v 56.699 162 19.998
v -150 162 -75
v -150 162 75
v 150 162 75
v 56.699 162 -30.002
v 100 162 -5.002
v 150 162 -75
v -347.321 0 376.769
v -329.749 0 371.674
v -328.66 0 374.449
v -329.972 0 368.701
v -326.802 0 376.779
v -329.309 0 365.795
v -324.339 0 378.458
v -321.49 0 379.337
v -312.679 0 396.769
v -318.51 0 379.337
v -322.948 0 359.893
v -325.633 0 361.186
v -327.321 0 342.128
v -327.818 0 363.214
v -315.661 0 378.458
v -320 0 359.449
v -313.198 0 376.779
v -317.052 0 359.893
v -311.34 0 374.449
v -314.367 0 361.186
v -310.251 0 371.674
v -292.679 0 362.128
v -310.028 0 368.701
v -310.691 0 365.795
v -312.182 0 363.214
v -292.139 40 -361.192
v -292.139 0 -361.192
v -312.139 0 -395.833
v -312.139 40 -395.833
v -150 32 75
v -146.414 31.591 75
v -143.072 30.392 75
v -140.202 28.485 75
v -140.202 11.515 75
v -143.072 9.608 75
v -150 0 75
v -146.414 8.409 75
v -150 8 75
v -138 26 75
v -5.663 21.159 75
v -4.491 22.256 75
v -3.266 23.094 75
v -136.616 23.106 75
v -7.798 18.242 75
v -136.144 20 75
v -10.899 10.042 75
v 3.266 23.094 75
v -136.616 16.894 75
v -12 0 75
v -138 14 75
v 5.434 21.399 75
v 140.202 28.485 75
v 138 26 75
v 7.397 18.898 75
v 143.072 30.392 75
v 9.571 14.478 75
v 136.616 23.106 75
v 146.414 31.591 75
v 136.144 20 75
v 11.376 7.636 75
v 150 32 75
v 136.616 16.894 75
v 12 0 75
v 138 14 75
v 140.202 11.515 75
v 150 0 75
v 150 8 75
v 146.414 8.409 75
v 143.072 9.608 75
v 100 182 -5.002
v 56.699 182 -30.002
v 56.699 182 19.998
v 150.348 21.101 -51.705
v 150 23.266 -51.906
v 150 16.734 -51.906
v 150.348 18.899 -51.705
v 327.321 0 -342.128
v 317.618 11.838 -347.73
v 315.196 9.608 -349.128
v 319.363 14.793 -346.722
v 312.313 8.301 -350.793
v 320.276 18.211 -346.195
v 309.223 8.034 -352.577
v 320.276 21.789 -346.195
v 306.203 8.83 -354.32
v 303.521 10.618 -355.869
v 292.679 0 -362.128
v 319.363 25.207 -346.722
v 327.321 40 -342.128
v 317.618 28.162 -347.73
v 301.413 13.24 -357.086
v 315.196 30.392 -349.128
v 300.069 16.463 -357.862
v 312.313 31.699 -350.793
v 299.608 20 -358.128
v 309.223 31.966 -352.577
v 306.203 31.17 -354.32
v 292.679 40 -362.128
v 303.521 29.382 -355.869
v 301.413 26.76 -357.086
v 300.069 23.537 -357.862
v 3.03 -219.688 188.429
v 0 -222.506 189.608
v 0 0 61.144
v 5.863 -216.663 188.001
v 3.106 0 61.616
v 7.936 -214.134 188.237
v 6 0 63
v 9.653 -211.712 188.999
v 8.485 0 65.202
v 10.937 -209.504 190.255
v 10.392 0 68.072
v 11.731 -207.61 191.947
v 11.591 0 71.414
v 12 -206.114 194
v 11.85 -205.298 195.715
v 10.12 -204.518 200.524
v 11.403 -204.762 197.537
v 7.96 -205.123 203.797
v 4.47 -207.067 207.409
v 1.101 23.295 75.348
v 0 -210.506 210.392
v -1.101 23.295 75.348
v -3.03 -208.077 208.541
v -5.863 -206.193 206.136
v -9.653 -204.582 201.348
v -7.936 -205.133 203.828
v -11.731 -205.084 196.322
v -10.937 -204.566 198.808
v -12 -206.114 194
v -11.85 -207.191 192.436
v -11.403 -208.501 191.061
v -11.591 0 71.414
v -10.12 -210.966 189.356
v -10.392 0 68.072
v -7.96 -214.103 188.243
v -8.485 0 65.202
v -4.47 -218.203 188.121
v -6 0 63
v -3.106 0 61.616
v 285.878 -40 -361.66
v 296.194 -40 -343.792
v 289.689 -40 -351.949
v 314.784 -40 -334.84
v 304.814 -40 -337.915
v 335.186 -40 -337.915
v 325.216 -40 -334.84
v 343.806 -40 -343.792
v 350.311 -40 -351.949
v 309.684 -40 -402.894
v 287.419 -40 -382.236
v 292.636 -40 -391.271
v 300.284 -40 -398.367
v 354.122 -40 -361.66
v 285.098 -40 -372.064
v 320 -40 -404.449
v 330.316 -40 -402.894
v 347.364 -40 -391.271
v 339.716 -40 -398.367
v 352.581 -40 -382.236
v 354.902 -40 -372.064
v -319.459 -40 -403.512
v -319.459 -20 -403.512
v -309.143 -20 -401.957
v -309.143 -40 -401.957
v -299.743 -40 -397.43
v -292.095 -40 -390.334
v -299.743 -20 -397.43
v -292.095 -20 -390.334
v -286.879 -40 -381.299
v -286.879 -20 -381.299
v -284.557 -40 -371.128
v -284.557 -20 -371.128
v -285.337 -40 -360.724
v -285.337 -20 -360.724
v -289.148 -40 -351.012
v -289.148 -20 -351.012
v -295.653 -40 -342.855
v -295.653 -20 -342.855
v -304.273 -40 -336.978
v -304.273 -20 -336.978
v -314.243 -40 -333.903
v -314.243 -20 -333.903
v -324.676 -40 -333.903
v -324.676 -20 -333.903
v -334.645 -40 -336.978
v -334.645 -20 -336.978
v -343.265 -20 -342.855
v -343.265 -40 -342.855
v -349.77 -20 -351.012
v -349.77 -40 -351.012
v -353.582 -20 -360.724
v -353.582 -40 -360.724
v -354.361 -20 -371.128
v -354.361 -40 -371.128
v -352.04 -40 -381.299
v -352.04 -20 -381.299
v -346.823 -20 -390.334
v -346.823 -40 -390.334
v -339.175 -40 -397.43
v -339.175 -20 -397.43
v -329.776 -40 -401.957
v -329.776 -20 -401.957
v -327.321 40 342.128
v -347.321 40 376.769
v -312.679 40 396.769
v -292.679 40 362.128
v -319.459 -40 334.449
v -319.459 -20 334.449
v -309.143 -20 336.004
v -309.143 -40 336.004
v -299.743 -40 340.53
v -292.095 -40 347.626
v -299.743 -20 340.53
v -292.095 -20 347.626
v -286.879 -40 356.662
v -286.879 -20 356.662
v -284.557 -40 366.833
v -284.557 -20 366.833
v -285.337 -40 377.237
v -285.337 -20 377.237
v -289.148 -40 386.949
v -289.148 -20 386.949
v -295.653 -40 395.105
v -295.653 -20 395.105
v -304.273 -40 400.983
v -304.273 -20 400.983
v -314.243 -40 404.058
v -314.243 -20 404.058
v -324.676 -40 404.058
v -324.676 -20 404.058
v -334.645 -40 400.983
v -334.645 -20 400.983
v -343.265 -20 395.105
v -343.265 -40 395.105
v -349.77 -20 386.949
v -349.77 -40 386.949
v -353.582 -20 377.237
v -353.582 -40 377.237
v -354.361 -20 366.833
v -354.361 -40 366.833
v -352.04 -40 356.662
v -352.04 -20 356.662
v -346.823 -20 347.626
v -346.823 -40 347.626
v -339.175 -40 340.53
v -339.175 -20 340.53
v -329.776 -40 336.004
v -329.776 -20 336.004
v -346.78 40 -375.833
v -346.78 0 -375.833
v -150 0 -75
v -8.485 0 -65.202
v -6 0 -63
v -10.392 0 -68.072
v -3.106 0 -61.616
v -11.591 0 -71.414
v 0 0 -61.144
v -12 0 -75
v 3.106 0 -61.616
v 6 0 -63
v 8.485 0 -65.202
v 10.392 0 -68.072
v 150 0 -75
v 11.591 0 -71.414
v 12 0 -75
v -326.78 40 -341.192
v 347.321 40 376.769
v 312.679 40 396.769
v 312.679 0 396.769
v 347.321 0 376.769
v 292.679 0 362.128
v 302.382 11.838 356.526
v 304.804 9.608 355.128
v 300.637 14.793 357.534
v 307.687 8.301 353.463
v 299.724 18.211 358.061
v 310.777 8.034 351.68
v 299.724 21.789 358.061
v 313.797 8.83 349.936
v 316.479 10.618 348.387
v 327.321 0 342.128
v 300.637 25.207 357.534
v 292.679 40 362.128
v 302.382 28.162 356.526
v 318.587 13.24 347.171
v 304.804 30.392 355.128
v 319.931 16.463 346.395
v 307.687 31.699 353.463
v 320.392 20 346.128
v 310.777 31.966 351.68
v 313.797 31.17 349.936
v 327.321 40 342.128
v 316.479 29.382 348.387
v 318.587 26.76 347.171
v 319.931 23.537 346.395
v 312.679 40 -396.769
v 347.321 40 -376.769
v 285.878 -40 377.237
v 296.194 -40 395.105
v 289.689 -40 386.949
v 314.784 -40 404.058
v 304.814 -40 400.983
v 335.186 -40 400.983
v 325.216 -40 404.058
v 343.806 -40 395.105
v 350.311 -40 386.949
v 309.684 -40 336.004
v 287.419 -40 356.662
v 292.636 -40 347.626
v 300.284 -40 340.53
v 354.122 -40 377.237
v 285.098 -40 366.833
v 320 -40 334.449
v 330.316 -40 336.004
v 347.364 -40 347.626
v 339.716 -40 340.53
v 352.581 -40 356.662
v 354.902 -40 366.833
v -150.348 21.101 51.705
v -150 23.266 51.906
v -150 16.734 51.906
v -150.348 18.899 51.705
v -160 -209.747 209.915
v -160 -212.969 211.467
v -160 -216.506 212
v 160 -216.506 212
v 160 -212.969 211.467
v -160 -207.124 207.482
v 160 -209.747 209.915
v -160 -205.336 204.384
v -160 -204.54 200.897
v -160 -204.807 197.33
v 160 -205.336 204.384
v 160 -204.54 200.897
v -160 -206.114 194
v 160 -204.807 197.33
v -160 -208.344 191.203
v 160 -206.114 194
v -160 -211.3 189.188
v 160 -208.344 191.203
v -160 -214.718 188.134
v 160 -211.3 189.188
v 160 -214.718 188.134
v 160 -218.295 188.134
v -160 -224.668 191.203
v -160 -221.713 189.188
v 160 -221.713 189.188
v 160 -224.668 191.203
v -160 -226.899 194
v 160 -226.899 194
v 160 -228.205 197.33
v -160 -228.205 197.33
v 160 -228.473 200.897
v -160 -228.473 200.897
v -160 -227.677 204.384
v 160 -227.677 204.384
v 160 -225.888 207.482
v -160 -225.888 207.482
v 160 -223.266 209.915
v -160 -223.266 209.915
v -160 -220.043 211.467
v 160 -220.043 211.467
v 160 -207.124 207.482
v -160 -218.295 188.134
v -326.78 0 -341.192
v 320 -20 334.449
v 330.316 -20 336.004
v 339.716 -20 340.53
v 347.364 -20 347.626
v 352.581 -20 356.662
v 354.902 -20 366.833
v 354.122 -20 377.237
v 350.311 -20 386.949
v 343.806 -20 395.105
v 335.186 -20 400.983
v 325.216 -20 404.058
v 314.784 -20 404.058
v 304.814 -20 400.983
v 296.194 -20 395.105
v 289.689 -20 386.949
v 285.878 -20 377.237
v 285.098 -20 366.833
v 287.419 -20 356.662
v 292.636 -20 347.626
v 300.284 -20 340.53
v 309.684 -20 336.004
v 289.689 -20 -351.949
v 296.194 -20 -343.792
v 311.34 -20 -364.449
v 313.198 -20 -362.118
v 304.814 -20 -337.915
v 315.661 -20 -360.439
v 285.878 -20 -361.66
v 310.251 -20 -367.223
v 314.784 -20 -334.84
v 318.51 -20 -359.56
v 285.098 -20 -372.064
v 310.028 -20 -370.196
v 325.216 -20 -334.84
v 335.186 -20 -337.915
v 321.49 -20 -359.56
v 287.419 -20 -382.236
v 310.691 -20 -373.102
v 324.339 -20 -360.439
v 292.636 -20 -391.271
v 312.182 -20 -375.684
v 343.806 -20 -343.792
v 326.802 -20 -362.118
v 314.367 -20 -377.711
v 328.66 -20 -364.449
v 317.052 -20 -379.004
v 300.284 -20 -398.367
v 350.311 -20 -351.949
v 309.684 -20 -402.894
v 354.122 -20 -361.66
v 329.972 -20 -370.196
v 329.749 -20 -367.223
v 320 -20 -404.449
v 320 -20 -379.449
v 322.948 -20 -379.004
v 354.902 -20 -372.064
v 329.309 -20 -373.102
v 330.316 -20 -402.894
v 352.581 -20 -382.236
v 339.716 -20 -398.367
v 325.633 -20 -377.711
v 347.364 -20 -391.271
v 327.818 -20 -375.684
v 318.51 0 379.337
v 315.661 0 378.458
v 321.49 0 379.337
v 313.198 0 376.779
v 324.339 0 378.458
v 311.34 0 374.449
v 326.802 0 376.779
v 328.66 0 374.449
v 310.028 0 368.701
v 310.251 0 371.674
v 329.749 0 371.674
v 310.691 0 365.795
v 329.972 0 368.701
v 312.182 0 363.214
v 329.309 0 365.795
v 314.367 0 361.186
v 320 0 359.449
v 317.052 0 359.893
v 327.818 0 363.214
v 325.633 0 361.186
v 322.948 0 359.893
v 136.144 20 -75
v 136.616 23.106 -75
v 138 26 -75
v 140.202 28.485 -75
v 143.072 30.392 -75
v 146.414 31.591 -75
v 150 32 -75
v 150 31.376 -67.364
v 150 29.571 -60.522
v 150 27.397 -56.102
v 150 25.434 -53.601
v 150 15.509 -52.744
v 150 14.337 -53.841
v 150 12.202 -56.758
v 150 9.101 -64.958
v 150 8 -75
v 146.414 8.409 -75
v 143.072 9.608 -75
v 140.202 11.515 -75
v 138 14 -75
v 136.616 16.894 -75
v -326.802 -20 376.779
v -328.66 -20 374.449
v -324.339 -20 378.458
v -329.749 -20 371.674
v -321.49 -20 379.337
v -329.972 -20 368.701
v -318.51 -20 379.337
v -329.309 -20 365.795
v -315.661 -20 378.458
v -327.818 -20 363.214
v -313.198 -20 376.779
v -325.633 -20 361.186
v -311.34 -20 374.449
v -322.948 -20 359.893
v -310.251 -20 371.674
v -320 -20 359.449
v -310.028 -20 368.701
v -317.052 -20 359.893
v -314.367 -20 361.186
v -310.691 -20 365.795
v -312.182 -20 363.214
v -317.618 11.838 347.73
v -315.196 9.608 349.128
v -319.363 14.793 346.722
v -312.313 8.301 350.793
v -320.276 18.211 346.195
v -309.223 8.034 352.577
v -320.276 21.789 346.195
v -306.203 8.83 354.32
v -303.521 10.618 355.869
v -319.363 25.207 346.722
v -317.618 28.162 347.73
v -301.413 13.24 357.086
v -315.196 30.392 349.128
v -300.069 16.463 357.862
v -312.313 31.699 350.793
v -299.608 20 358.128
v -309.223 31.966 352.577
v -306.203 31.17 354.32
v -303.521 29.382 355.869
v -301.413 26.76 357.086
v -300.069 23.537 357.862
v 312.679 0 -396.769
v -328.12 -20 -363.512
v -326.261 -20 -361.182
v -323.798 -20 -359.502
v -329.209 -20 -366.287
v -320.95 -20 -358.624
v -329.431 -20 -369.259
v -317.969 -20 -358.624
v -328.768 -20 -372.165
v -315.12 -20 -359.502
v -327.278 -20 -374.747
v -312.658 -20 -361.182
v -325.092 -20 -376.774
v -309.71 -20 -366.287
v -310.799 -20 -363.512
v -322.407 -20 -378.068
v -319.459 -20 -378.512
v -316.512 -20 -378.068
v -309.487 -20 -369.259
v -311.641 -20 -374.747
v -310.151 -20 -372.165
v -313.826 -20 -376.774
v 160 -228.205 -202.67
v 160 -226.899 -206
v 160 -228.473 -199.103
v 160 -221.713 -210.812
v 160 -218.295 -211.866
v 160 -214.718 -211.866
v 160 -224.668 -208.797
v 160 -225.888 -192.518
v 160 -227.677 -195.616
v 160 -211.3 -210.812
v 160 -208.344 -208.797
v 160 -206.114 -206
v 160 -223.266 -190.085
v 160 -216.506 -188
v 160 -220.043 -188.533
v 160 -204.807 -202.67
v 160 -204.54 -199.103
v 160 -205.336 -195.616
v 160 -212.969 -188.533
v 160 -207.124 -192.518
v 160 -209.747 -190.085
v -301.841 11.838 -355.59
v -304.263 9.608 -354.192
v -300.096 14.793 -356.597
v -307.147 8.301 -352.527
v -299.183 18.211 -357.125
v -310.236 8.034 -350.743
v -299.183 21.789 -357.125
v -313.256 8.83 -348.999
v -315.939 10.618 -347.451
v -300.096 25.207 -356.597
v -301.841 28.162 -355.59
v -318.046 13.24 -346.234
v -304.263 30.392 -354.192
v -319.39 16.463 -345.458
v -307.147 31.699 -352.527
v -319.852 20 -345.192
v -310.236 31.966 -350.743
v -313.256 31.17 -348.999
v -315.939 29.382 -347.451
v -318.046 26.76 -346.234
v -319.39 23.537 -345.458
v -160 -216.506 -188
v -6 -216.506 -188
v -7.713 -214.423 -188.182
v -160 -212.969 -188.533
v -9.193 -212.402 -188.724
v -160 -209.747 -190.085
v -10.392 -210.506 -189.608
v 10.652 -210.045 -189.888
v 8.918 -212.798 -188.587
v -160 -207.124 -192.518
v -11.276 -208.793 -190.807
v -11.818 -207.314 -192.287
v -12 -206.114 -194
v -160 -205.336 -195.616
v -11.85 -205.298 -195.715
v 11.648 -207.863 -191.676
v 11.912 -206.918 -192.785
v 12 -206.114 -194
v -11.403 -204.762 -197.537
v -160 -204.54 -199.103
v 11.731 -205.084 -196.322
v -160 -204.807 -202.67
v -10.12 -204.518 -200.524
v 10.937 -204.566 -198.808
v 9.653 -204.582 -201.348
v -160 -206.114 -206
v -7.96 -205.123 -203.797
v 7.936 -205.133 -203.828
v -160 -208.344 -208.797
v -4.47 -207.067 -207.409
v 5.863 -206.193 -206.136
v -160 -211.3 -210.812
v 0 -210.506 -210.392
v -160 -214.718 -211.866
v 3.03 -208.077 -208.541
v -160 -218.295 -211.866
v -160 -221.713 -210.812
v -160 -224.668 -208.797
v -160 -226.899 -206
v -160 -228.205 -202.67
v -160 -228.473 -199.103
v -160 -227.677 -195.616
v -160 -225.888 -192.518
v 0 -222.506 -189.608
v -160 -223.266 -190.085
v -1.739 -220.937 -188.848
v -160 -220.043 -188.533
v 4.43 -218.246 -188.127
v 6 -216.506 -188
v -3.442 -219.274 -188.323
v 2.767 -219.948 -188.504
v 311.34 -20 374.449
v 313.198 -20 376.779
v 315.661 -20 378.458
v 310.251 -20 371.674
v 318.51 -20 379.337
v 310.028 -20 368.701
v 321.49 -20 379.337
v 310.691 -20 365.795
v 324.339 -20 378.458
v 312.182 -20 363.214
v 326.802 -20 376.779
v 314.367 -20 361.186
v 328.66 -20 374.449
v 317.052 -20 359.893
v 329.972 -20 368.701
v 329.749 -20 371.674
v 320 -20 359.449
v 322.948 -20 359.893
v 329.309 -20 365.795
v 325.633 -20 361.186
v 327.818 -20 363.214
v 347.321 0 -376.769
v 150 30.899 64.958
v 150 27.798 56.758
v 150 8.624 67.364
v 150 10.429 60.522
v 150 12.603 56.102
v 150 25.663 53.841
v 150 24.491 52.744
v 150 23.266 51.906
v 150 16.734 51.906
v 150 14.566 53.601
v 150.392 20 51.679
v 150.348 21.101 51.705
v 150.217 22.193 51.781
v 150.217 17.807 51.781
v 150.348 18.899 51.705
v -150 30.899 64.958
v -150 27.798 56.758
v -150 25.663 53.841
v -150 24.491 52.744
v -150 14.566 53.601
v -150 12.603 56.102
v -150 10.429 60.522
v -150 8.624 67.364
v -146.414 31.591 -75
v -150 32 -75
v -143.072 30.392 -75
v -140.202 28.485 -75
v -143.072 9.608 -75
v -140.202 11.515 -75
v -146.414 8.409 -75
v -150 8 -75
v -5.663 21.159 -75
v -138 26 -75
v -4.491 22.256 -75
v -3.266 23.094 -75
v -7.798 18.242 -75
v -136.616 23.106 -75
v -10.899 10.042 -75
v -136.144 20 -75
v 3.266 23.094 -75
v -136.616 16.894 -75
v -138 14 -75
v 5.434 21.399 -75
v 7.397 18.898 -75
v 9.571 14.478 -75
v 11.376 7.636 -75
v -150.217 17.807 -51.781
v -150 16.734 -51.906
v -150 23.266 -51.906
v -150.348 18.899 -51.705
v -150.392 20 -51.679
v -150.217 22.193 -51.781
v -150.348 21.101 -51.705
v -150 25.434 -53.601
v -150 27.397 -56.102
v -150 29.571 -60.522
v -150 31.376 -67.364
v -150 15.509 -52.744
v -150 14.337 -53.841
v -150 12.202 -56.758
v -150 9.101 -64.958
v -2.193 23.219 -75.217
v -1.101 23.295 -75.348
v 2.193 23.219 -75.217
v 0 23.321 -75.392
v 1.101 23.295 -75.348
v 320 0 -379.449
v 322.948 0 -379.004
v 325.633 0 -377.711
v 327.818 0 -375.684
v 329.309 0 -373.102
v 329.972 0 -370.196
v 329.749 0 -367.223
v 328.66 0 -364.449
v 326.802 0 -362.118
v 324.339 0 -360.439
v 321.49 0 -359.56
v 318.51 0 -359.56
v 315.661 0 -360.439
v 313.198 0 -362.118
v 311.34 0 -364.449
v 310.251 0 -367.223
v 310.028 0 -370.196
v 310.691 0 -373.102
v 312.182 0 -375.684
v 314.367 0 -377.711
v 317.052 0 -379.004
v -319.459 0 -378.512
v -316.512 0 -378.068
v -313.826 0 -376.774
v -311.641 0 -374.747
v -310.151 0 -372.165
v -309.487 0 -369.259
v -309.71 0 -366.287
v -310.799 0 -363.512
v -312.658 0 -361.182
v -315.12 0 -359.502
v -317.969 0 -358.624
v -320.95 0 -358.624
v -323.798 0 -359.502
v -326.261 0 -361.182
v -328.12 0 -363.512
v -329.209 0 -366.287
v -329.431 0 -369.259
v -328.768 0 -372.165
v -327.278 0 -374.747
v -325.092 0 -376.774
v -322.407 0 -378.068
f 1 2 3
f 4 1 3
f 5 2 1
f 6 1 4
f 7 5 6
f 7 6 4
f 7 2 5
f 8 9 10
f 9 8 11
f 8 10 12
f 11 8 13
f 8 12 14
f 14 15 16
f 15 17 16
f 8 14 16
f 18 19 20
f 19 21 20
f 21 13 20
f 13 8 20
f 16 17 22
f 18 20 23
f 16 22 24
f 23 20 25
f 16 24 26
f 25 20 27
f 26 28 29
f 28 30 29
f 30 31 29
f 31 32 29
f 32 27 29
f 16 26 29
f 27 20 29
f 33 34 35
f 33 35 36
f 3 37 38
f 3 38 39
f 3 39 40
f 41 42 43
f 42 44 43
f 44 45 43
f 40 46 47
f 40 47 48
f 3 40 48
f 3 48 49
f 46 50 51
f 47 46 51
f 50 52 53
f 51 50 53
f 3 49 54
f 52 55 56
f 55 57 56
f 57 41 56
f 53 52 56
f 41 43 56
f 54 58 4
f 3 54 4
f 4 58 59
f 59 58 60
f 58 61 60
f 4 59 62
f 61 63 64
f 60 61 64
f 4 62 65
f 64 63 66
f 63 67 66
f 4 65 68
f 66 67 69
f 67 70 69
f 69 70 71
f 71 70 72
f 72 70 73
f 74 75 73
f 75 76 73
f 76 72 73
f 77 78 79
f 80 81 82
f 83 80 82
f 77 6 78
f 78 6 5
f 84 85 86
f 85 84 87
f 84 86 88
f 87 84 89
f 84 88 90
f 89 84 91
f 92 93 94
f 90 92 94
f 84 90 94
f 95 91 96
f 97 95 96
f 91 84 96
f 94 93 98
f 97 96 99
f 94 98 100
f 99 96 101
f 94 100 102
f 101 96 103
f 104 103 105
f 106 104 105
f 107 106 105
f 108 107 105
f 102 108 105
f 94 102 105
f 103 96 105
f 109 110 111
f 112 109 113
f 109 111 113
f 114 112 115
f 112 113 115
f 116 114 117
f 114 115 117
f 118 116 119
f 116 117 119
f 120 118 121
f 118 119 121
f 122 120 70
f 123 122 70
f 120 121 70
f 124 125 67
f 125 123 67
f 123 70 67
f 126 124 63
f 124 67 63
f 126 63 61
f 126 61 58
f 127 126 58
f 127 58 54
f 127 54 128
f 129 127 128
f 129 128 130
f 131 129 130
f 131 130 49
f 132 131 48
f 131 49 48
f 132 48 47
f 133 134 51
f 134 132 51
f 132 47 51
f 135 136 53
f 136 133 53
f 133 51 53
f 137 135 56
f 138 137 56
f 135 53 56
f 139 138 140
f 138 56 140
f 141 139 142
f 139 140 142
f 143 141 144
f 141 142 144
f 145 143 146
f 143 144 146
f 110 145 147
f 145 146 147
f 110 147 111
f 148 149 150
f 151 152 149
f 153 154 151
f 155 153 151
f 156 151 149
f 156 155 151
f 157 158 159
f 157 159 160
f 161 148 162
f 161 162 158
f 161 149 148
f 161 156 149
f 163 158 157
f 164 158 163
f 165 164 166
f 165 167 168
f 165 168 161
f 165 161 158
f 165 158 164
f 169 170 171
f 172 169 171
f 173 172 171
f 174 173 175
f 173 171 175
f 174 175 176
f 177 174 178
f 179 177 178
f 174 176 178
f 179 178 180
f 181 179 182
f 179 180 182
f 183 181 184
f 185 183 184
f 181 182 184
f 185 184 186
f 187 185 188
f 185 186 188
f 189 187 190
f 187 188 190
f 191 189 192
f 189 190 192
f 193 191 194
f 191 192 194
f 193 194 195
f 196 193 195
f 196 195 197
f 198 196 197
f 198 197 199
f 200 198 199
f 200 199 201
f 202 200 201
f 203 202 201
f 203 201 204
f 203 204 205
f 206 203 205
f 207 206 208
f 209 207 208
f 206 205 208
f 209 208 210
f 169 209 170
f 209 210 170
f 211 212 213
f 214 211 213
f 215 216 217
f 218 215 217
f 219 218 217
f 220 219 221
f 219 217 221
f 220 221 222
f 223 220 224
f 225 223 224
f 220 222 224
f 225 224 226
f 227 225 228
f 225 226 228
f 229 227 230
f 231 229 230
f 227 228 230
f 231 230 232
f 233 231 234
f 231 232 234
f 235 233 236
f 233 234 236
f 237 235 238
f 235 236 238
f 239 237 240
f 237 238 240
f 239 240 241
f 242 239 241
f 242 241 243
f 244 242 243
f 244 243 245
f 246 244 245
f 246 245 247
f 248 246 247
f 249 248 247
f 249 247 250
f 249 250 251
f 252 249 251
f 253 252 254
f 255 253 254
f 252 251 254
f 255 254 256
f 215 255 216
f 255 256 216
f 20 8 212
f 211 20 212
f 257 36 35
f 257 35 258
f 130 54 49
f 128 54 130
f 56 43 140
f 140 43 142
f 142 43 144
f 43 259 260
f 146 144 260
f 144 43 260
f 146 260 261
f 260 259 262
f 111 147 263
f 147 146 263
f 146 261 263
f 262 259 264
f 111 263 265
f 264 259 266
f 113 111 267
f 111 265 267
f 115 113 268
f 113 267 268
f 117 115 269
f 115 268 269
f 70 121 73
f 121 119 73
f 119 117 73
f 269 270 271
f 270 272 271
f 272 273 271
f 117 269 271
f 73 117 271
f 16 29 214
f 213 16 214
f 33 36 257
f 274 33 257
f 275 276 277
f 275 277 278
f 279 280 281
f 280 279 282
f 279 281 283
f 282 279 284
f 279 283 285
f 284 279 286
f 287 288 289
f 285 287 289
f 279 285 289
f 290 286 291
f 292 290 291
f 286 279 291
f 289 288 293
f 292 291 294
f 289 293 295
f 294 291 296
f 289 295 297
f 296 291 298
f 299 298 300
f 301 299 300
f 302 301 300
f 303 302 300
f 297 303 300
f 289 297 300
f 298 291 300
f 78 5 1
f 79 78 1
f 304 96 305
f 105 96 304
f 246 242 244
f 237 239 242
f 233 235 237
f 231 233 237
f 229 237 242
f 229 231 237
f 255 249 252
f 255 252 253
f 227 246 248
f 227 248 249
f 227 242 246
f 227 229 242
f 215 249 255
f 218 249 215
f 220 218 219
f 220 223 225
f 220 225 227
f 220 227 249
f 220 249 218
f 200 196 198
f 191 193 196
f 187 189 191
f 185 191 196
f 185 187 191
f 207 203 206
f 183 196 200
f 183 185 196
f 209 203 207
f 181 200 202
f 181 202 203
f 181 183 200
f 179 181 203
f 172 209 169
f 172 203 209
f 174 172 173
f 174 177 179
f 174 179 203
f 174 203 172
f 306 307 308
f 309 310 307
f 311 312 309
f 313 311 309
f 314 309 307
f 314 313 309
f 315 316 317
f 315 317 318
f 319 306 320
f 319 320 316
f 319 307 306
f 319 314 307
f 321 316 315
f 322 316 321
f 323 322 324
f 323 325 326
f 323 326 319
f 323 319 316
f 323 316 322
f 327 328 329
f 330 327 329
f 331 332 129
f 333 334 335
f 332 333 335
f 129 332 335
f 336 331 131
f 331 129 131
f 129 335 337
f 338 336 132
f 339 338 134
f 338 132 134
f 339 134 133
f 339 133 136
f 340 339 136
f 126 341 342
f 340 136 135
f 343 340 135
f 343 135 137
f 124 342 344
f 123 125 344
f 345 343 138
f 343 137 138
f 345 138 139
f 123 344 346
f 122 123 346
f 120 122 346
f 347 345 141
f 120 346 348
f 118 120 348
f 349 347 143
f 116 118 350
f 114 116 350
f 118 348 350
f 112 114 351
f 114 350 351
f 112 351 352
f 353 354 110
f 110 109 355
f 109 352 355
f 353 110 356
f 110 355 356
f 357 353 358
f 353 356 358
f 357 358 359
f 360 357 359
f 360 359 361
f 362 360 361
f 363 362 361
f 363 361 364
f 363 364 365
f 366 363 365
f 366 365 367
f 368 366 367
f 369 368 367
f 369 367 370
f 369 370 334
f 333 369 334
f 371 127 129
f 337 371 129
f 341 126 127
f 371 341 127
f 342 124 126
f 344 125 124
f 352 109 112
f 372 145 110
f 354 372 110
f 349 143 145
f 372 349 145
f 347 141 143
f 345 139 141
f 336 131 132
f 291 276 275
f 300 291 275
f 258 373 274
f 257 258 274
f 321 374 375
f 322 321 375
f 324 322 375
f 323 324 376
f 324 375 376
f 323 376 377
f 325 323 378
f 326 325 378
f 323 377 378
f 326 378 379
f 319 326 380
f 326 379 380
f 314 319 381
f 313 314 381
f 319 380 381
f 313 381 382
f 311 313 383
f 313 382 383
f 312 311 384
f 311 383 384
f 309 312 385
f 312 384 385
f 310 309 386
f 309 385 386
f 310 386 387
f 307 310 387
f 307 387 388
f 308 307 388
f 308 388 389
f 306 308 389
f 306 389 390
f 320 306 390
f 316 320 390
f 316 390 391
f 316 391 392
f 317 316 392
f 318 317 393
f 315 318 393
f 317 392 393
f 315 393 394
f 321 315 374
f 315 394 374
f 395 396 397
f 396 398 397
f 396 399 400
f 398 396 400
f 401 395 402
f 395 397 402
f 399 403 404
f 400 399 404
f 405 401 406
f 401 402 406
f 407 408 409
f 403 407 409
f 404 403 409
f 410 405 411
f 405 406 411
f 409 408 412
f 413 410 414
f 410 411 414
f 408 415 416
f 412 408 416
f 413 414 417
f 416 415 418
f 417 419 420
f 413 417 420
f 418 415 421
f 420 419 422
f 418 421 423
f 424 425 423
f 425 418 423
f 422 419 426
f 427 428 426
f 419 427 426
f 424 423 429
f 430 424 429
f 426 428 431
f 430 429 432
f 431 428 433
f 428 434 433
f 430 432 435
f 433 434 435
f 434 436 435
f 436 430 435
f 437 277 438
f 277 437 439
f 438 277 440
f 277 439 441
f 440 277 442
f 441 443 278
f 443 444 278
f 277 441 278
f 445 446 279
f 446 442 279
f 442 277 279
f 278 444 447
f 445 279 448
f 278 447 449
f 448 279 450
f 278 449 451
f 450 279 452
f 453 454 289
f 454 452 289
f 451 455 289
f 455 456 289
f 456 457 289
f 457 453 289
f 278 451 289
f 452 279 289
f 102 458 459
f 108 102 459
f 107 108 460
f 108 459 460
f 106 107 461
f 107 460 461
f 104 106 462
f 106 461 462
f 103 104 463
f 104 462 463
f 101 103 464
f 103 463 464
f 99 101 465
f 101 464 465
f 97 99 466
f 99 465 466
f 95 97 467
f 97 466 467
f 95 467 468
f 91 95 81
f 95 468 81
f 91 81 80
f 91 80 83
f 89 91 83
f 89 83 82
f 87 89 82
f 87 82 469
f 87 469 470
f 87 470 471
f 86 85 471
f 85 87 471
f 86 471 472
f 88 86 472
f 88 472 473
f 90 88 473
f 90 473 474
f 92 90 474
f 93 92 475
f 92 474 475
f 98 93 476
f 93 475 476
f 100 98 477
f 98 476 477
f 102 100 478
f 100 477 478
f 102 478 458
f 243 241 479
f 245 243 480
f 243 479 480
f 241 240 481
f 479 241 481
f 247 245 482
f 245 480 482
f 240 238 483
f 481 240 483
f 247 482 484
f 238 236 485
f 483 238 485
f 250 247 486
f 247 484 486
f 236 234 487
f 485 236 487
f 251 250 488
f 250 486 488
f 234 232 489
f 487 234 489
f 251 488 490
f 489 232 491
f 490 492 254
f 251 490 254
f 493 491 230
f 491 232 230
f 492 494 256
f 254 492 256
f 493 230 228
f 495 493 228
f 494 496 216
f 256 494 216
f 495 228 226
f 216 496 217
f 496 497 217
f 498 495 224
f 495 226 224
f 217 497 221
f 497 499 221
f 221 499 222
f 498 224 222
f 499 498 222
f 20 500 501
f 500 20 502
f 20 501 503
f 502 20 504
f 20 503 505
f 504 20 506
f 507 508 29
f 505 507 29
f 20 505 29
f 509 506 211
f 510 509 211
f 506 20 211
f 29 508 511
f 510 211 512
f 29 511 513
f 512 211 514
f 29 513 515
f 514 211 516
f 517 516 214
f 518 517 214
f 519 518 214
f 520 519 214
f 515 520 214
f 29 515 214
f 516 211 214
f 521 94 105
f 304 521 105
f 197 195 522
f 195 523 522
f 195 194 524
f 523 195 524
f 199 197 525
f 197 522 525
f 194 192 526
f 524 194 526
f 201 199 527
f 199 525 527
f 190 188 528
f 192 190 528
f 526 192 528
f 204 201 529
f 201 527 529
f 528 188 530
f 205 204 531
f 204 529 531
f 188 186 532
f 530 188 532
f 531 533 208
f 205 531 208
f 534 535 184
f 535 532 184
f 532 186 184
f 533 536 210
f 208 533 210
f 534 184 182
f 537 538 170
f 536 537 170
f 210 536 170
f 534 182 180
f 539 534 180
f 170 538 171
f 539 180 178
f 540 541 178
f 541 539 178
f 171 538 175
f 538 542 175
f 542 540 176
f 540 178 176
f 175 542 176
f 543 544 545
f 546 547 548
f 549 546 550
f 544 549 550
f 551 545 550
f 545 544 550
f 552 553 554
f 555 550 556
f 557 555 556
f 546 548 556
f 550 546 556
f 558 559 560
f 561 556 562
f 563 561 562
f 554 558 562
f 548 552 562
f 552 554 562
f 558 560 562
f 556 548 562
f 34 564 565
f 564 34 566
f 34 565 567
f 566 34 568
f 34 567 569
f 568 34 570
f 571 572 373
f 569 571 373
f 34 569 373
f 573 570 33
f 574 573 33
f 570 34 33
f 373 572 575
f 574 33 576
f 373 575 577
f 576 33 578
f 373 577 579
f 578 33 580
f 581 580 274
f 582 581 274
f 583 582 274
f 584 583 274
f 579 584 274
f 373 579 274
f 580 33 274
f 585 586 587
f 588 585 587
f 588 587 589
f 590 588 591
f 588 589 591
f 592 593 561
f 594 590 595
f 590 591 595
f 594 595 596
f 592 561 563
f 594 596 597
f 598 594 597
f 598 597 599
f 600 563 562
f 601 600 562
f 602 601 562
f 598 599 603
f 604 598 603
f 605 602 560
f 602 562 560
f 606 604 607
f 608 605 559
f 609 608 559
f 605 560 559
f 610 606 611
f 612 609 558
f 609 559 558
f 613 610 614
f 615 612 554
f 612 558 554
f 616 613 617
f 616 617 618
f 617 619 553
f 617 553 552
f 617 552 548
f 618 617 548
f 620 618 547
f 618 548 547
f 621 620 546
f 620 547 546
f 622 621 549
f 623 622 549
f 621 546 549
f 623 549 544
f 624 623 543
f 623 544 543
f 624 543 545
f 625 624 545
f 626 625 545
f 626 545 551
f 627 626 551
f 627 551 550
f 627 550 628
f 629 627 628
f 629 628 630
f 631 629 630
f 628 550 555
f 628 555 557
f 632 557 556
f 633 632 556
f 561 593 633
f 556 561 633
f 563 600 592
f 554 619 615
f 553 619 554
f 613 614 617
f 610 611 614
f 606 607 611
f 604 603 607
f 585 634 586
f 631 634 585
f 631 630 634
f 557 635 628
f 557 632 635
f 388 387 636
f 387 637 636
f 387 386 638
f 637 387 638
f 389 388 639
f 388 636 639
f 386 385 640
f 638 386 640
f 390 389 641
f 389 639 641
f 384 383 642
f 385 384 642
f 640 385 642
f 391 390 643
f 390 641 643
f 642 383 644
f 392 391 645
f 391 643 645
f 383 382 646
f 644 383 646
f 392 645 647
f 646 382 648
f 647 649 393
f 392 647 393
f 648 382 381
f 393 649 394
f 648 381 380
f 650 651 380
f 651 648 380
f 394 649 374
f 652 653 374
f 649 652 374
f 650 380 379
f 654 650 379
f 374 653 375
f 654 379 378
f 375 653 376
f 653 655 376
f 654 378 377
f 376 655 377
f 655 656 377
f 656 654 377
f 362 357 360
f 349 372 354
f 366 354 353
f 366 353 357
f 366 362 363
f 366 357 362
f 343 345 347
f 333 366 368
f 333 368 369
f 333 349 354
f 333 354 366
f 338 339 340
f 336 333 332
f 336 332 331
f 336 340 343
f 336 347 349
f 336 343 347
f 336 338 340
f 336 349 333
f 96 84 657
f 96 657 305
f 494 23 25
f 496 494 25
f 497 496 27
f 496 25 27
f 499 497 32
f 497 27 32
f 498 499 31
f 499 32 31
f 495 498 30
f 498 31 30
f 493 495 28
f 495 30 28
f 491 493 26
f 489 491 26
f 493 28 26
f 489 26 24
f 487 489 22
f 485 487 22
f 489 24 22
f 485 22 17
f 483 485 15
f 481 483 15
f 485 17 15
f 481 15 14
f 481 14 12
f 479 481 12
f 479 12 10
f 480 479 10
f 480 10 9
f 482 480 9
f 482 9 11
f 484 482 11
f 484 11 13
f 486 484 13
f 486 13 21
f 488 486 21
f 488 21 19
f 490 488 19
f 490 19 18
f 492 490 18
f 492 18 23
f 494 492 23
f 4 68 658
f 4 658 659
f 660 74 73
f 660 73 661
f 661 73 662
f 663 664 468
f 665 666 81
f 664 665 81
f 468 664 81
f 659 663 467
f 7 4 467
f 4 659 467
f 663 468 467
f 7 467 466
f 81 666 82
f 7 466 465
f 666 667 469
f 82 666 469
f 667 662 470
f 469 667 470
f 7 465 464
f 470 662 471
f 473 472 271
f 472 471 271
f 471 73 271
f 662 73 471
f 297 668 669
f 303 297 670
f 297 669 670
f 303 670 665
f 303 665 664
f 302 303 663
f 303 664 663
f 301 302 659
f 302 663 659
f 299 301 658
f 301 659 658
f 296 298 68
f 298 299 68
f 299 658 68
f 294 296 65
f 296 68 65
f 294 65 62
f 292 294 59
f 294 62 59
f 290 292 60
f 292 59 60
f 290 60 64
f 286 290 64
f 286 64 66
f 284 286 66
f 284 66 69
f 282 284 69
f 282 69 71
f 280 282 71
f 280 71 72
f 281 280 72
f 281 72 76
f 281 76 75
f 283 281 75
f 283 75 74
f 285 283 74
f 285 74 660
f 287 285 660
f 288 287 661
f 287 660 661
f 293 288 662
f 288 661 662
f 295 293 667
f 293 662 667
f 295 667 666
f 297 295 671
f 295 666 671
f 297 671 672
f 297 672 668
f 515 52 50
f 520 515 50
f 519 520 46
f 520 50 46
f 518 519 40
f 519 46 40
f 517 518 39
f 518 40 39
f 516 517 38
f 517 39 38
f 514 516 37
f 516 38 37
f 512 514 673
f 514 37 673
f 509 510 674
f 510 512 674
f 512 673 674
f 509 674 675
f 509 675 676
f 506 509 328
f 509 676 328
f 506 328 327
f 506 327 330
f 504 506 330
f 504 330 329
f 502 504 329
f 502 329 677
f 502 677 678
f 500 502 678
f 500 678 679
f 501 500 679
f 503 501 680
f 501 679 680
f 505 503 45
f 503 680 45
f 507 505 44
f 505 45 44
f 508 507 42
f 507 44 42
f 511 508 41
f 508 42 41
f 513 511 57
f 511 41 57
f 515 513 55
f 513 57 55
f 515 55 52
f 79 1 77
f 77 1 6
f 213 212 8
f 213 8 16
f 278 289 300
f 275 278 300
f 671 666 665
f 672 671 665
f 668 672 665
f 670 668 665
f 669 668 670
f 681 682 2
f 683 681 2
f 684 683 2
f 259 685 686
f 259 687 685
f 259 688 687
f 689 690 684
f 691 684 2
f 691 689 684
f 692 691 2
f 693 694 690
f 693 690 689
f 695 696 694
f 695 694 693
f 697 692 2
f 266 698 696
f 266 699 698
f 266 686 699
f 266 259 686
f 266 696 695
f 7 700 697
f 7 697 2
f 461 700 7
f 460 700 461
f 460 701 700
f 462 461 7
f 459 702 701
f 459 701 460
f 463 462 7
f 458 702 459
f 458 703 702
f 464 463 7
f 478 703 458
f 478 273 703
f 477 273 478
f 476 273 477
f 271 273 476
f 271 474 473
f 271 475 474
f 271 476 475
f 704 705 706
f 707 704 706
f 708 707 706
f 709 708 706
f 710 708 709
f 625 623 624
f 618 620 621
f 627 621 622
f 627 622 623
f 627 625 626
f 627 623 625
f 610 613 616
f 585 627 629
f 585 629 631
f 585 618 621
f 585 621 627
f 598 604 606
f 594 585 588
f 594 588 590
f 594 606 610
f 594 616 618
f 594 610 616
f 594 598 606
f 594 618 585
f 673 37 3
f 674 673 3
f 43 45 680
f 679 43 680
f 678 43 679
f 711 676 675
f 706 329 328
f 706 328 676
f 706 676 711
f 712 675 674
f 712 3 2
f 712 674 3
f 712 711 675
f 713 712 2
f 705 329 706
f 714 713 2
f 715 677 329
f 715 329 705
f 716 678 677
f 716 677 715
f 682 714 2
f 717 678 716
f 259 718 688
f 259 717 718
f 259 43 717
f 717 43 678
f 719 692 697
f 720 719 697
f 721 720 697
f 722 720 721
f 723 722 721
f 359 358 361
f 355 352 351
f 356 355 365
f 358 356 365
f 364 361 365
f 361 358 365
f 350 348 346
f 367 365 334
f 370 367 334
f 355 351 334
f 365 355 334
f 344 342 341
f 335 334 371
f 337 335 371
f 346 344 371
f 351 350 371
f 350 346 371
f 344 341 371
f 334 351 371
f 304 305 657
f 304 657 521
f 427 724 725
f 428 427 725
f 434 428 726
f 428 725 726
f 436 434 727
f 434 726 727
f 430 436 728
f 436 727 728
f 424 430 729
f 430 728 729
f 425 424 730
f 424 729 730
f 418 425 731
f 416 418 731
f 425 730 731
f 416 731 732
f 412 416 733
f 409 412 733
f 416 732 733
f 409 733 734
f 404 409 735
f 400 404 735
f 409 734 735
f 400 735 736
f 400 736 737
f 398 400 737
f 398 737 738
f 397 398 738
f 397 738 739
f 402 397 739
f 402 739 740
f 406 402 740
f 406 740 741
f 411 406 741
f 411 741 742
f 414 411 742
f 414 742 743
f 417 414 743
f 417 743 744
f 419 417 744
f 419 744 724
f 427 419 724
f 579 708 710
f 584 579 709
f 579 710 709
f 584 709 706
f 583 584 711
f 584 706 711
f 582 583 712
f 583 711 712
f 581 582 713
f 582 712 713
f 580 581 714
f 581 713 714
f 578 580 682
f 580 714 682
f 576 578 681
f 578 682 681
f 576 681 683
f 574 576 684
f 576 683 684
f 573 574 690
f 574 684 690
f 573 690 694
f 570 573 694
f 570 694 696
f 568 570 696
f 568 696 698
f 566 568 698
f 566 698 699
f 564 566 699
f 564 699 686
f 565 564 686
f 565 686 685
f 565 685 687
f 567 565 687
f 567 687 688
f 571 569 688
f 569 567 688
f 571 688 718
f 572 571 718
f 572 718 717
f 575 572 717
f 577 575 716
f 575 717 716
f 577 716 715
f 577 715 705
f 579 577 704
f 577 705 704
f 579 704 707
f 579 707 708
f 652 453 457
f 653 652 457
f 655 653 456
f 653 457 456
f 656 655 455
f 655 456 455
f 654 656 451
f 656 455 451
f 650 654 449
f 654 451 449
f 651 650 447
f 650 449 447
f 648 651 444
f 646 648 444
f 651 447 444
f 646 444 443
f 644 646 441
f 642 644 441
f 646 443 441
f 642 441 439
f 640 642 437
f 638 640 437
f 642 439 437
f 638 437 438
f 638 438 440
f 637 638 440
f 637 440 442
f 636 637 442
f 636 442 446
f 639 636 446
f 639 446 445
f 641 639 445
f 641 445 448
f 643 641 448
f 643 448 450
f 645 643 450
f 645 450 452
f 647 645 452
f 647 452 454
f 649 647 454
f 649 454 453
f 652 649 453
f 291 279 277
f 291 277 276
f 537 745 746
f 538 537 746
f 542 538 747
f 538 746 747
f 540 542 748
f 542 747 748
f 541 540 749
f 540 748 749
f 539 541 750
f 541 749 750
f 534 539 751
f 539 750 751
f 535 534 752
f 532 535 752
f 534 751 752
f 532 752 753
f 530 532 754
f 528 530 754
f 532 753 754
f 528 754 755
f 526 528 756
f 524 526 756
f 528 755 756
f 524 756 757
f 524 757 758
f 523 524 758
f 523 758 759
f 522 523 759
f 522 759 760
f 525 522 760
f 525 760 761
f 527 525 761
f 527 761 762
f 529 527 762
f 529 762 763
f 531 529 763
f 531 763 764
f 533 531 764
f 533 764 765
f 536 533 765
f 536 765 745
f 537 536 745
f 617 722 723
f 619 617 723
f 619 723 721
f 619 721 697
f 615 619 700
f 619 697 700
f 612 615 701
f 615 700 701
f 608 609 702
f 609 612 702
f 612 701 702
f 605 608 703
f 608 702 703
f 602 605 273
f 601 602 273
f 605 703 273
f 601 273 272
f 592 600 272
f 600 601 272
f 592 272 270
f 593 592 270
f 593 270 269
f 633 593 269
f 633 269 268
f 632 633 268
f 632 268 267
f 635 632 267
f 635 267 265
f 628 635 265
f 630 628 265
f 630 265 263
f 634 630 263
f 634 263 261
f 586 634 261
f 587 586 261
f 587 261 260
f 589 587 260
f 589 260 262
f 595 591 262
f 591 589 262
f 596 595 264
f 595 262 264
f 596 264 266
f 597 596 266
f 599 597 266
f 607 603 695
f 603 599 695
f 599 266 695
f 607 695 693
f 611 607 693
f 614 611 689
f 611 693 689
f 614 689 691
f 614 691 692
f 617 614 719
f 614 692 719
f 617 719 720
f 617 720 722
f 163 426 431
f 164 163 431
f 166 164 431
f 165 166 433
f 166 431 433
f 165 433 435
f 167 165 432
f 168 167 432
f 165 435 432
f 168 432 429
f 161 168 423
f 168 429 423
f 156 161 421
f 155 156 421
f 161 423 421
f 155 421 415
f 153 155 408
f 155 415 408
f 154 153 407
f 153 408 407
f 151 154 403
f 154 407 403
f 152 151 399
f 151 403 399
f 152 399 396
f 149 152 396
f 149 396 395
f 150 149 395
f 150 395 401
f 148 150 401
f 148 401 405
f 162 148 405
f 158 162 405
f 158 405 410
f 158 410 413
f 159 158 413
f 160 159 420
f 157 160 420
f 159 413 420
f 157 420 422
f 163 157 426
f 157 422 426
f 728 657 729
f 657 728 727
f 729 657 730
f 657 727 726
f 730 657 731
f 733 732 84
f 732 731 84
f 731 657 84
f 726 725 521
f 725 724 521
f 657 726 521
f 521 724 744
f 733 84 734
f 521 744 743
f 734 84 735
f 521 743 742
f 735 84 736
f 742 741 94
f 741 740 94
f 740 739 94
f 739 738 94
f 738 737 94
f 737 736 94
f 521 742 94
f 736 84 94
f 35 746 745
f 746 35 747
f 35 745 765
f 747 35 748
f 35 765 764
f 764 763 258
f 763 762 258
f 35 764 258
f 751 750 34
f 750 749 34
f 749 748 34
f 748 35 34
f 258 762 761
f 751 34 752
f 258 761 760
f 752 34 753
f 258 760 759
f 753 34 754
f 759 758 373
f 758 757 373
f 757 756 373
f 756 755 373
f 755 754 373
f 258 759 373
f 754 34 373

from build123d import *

# Parameters (mm, degrees)
SKETCH_9_W            = 300
SKETCH_9_H            = 150
EXTRUDE_2_DEPTH       = 162
EXTRUDE_3_DEPTH       = 340
EXTRUDE_3_DEPTH_BACK  = 20
SKETCH_10_R           = 12
EXTRUDE_4_DEPTH       = 338.918510241
EXTRUDE_4_DEPTH_BACK  = 20
SKETCH_11_R           = 12
EXTRUDE_5_DEPTH       = 340
EXTRUDE_5_DEPTH_BACK  = 20
SKETCH_13_R           = 12
EXTRUDE_6_DEPTH       = 340
EXTRUDE_6_DEPTH_BACK  = 20
SKETCH_12_R           = 12
EXTRUDE_7_DEPTH       = 20
EXTRUDE_7_DEPTH_BACK  = 20
SKETCH_14_W           = 40
SKETCH_14_H           = 40
EXTRUDE_8_DEPTH       = 20
EXTRUDE_8_DEPTH_BACK  = 20
SKETCH_17_W           = 40
SKETCH_17_H           = 40
EXTRUDE_9_DEPTH       = 20
EXTRUDE_9_DEPTH_BACK  = 20
SKETCH_18_W           = 40
SKETCH_18_H           = 40
EXTRUDE_10_DEPTH      = 20
EXTRUDE_10_DEPTH_BACK = 20
SKETCH_20_W           = 40
SKETCH_20_H           = 40
EXTRUDE_11_DEPTH      = 20
EXTRUDE_11_DEPTH_BACK = 20
SKETCH_21_R           = 10
SKETCH_22_R           = 35
EXTRUDE_12_DEPTH      = 20
EXTRUDE_13_DEPTH      = 250
EXTRUDE_13_DEPTH_BACK = 20
SKETCH_23_R           = 12
EXTRUDE_14_DEPTH      = 250
EXTRUDE_14_DEPTH_BACK = 20
SKETCH_24_R           = 12
EXTRUDE_15_DEPTH      = 20
EXTRUDE_15_DEPTH_BACK = 20
EXTRUDE_16_DEPTH      = 160
EXTRUDE_16_DEPTH_BACK = 160
SKETCH_29_R           = 12


with BuildPart() as part:
    # 草图9 → 凸台-拉伸2 (new body)
    with BuildSketch(Plane(origin=(0, 0, 0), x_dir=(1, 0, 0), z_dir=(0, 1, 0))):
        Rectangle(SKETCH_9_W, SKETCH_9_H)
    extrude(amount=EXTRUDE_2_DEPTH)

    # 草图10 → 凸台-拉伸3 (add, two sides: drawn at the far end of the back side and taken through both)
    with BuildSketch(Plane(origin=(-69.975952642, 0, 121.201905284), x_dir=(0, -1, 0), z_dir=(-0.500000000000001, 0, 0.866025403784438)).offset(-EXTRUDE_3_DEPTH_BACK)):
        with Locations(Location((-20, -92.403810568, 0), (0, 0, 90))):
            Circle(SKETCH_10_R)
    extrude(amount=EXTRUDE_3_DEPTH + EXTRUDE_3_DEPTH_BACK)

    # 草图11 → 凸台-拉伸4 (add, two sides: drawn at the far end of the back side and taken through both)
    with BuildSketch(Plane(origin=(-69.975952642, 0, -121.201905284), x_dir=(0, -1, 0), z_dir=(-0.5000000000000011, 0, -0.866025403784438)).offset(-EXTRUDE_4_DEPTH_BACK)):
        with Locations(Location((-20, 92.403810568, 0), (0, 0, 90))):
            Circle(SKETCH_11_R)
    extrude(amount=EXTRUDE_4_DEPTH + EXTRUDE_4_DEPTH_BACK)

    # 草图13 → 凸台-拉伸5 (add, two sides: drawn at the far end of the back side and taken through both)
    with BuildSketch(Plane(origin=(69.975952642, 0, 121.201905284), x_dir=(0, -1, 0), z_dir=(0.5000000000000011, 0, 0.866025403784438)).offset(-EXTRUDE_5_DEPTH_BACK)):
        with Locations(Location((-20, 92.403810568, 0), (0, 0, 90))):
            Circle(SKETCH_13_R)
    extrude(amount=EXTRUDE_5_DEPTH + EXTRUDE_5_DEPTH_BACK)

    # 草图12 → 凸台-拉伸6 (add, two sides: drawn at the far end of the back side and taken through both)
    with BuildSketch(Plane(origin=(69.975952642, 0, -121.201905284), x_dir=(0, -1, 0), z_dir=(0.5000000000000009, 0, -0.866025403784438)).offset(-EXTRUDE_6_DEPTH_BACK)):
        with Locations(Location((-20, -92.403810568, 0), (0, 0, 90))):
            Circle(SKETCH_12_R)
    extrude(amount=EXTRUDE_6_DEPTH + EXTRUDE_6_DEPTH_BACK)

    # 草图14 → 凸台-拉伸7 (add, two sides: drawn at the far end of the back side and taken through both)
    with BuildSketch(Plane(origin=(-239.975952642, 0, 415.650542571), x_dir=(0.8660254037844382, 0, 0.500000000000001), z_dir=(-0.500000000000001, 0, 0.8660254037844382)).offset(-EXTRUDE_7_DEPTH_BACK)):
        with Locations((-92.403810568, 20)):
            Rectangle(SKETCH_14_W, SKETCH_14_H)
    extrude(amount=EXTRUDE_7_DEPTH + EXTRUDE_7_DEPTH_BACK)

    # 草图17 → 凸台-拉伸8 (add, two sides: drawn at the far end of the back side and taken through both)
    with BuildSketch(Plane(origin=(-239.435207762, 0, -414.713944965), x_dir=(-0.866025403784438, 0, 0.5000000000000012), z_dir=(-0.5000000000000011, 0, -0.8660254037844379)).offset(-EXTRUDE_8_DEPTH_BACK)):
        with Locations((92.403810568, 20)):
            Rectangle(SKETCH_17_W, SKETCH_17_H)
    extrude(amount=EXTRUDE_8_DEPTH + EXTRUDE_8_DEPTH_BACK)

    # 草图18 → 凸台-拉伸9 (add, two sides: drawn at the far end of the back side and taken through both)
    with BuildSketch(Plane(origin=(239.975952642, 0, -415.650542571), x_dir=(-0.866025403784438, 0, -0.5000000000000012), z_dir=(0.5000000000000011, 0, -0.8660254037844379)).offset(-EXTRUDE_9_DEPTH_BACK)):
        with Locations((-92.403810568, 20)):
            Rectangle(SKETCH_18_W, SKETCH_18_H)
    extrude(amount=EXTRUDE_9_DEPTH + EXTRUDE_9_DEPTH_BACK)

    # 草图20 → 凸台-拉伸10 (add, two sides: drawn at the far end of the back side and taken through both)
    with BuildSketch(Plane(origin=(239.975952642, 0, 415.650542571), x_dir=(0.866025403784438, 0, -0.5000000000000012), z_dir=(0.5000000000000011, 0, 0.8660254037844379)).offset(-EXTRUDE_10_DEPTH_BACK)):
        with Locations((92.403810568, 20)):
            Rectangle(SKETCH_20_W, SKETCH_20_H)
    extrude(amount=EXTRUDE_10_DEPTH + EXTRUDE_10_DEPTH_BACK)

    # 草图21 → 凸台-拉伸11 (add, two sides: drawn at the far end of the back side and taken through both)
    with BuildSketch(Plane.XZ.offset(-EXTRUDE_11_DEPTH_BACK)):
        with Locations(Location((-320, 369.448637287, 0), (0, 0, 270))):
            Circle(SKETCH_21_R)
        with Locations(Location((-319.45925512, -368.512039681, 0), (0, 0, 270))):
            Circle(SKETCH_21_R)
        with Locations(Location((320, -369.448637287, 0), (0, 0, 270))):
            Circle(SKETCH_21_R)
        with Locations(Location((320, 369.448637287, 0), (0, 0, 270))):
            Circle(SKETCH_21_R)
    extrude(amount=EXTRUDE_11_DEPTH + EXTRUDE_11_DEPTH_BACK)

    # 草图22 → 凸台-拉伸12 (add)
    with BuildSketch(Plane.XZ.offset(20)):
        with Locations(Location((-319.45925512, -368.512039681, 0), (0, 0, 270))):
            Circle(SKETCH_22_R)
        with Locations(Location((320, -369.448637287, 0), (0, 0, 270))):
            Circle(SKETCH_22_R)
        with Locations(Location((320, 369.448637287, 0), (0, 0, 270))):
            Circle(SKETCH_22_R)
        with Locations(Location((-319.45925512, 369.448637287, 0), (0, 0, 270))):
            Circle(SKETCH_22_R)
    extrude(amount=EXTRUDE_12_DEPTH)

    # 草图23 → 凸台-拉伸13 (add, two sides: drawn at the far end of the back side and taken through both)
    with BuildSketch(Plane(origin=(0, -32.475952642, 18.75), x_dir=(1, 0, 0), z_dir=(0, -0.866025403784438, 0.500000000000001)).offset(-EXTRUDE_13_DEPTH_BACK)):
        with Locations(Location((0, 64.951905284, 0), (0, 0, 270))):
            Circle(SKETCH_23_R)
    extrude(amount=EXTRUDE_13_DEPTH + EXTRUDE_13_DEPTH_BACK)

    # 草图24 → 凸台-拉伸14 (add, two sides: drawn at the far end of the back side and taken through both)
    with BuildSketch(Plane(origin=(0, -32.475952642, -18.75), x_dir=(-1, 0, 0), z_dir=(0, -0.866025403784438, -0.500000000000001)).offset(-EXTRUDE_14_DEPTH_BACK)):
        with Locations(Location((0, 64.951905284, 0), (0, 0, 90))):
            Circle(SKETCH_24_R)
    extrude(amount=EXTRUDE_14_DEPTH + EXTRUDE_14_DEPTH_BACK)

    # 草图26 → 凸台-拉伸15 (add, two sides: drawn at the far end of the back side and taken through both)
    with BuildSketch(Plane(origin=(0, 162, 0), x_dir=(1, 0, 0), z_dir=(0, 1, 0)).offset(-EXTRUDE_15_DEPTH_BACK)):
        Polygon((100, 5.002088535), (56.698729811, 30.002088535), (56.698729811, -19.997911465), align=None)
    extrude(amount=EXTRUDE_15_DEPTH + EXTRUDE_15_DEPTH_BACK)

    # 草图29 → 凸台-拉伸16 (add, two sides: drawn at the far end of the back side and taken through both)
    with BuildSketch(Plane.ZY.offset(-EXTRUDE_16_DEPTH_BACK)):
        with Locations((-200, -216.506350946)):
            Circle(SKETCH_29_R)
        with Locations((200, -216.506350946)):
            Circle(SKETCH_29_R)
    extrude(amount=EXTRUDE_16_DEPTH + EXTRUDE_16_DEPTH_BACK)


solid = part.part
